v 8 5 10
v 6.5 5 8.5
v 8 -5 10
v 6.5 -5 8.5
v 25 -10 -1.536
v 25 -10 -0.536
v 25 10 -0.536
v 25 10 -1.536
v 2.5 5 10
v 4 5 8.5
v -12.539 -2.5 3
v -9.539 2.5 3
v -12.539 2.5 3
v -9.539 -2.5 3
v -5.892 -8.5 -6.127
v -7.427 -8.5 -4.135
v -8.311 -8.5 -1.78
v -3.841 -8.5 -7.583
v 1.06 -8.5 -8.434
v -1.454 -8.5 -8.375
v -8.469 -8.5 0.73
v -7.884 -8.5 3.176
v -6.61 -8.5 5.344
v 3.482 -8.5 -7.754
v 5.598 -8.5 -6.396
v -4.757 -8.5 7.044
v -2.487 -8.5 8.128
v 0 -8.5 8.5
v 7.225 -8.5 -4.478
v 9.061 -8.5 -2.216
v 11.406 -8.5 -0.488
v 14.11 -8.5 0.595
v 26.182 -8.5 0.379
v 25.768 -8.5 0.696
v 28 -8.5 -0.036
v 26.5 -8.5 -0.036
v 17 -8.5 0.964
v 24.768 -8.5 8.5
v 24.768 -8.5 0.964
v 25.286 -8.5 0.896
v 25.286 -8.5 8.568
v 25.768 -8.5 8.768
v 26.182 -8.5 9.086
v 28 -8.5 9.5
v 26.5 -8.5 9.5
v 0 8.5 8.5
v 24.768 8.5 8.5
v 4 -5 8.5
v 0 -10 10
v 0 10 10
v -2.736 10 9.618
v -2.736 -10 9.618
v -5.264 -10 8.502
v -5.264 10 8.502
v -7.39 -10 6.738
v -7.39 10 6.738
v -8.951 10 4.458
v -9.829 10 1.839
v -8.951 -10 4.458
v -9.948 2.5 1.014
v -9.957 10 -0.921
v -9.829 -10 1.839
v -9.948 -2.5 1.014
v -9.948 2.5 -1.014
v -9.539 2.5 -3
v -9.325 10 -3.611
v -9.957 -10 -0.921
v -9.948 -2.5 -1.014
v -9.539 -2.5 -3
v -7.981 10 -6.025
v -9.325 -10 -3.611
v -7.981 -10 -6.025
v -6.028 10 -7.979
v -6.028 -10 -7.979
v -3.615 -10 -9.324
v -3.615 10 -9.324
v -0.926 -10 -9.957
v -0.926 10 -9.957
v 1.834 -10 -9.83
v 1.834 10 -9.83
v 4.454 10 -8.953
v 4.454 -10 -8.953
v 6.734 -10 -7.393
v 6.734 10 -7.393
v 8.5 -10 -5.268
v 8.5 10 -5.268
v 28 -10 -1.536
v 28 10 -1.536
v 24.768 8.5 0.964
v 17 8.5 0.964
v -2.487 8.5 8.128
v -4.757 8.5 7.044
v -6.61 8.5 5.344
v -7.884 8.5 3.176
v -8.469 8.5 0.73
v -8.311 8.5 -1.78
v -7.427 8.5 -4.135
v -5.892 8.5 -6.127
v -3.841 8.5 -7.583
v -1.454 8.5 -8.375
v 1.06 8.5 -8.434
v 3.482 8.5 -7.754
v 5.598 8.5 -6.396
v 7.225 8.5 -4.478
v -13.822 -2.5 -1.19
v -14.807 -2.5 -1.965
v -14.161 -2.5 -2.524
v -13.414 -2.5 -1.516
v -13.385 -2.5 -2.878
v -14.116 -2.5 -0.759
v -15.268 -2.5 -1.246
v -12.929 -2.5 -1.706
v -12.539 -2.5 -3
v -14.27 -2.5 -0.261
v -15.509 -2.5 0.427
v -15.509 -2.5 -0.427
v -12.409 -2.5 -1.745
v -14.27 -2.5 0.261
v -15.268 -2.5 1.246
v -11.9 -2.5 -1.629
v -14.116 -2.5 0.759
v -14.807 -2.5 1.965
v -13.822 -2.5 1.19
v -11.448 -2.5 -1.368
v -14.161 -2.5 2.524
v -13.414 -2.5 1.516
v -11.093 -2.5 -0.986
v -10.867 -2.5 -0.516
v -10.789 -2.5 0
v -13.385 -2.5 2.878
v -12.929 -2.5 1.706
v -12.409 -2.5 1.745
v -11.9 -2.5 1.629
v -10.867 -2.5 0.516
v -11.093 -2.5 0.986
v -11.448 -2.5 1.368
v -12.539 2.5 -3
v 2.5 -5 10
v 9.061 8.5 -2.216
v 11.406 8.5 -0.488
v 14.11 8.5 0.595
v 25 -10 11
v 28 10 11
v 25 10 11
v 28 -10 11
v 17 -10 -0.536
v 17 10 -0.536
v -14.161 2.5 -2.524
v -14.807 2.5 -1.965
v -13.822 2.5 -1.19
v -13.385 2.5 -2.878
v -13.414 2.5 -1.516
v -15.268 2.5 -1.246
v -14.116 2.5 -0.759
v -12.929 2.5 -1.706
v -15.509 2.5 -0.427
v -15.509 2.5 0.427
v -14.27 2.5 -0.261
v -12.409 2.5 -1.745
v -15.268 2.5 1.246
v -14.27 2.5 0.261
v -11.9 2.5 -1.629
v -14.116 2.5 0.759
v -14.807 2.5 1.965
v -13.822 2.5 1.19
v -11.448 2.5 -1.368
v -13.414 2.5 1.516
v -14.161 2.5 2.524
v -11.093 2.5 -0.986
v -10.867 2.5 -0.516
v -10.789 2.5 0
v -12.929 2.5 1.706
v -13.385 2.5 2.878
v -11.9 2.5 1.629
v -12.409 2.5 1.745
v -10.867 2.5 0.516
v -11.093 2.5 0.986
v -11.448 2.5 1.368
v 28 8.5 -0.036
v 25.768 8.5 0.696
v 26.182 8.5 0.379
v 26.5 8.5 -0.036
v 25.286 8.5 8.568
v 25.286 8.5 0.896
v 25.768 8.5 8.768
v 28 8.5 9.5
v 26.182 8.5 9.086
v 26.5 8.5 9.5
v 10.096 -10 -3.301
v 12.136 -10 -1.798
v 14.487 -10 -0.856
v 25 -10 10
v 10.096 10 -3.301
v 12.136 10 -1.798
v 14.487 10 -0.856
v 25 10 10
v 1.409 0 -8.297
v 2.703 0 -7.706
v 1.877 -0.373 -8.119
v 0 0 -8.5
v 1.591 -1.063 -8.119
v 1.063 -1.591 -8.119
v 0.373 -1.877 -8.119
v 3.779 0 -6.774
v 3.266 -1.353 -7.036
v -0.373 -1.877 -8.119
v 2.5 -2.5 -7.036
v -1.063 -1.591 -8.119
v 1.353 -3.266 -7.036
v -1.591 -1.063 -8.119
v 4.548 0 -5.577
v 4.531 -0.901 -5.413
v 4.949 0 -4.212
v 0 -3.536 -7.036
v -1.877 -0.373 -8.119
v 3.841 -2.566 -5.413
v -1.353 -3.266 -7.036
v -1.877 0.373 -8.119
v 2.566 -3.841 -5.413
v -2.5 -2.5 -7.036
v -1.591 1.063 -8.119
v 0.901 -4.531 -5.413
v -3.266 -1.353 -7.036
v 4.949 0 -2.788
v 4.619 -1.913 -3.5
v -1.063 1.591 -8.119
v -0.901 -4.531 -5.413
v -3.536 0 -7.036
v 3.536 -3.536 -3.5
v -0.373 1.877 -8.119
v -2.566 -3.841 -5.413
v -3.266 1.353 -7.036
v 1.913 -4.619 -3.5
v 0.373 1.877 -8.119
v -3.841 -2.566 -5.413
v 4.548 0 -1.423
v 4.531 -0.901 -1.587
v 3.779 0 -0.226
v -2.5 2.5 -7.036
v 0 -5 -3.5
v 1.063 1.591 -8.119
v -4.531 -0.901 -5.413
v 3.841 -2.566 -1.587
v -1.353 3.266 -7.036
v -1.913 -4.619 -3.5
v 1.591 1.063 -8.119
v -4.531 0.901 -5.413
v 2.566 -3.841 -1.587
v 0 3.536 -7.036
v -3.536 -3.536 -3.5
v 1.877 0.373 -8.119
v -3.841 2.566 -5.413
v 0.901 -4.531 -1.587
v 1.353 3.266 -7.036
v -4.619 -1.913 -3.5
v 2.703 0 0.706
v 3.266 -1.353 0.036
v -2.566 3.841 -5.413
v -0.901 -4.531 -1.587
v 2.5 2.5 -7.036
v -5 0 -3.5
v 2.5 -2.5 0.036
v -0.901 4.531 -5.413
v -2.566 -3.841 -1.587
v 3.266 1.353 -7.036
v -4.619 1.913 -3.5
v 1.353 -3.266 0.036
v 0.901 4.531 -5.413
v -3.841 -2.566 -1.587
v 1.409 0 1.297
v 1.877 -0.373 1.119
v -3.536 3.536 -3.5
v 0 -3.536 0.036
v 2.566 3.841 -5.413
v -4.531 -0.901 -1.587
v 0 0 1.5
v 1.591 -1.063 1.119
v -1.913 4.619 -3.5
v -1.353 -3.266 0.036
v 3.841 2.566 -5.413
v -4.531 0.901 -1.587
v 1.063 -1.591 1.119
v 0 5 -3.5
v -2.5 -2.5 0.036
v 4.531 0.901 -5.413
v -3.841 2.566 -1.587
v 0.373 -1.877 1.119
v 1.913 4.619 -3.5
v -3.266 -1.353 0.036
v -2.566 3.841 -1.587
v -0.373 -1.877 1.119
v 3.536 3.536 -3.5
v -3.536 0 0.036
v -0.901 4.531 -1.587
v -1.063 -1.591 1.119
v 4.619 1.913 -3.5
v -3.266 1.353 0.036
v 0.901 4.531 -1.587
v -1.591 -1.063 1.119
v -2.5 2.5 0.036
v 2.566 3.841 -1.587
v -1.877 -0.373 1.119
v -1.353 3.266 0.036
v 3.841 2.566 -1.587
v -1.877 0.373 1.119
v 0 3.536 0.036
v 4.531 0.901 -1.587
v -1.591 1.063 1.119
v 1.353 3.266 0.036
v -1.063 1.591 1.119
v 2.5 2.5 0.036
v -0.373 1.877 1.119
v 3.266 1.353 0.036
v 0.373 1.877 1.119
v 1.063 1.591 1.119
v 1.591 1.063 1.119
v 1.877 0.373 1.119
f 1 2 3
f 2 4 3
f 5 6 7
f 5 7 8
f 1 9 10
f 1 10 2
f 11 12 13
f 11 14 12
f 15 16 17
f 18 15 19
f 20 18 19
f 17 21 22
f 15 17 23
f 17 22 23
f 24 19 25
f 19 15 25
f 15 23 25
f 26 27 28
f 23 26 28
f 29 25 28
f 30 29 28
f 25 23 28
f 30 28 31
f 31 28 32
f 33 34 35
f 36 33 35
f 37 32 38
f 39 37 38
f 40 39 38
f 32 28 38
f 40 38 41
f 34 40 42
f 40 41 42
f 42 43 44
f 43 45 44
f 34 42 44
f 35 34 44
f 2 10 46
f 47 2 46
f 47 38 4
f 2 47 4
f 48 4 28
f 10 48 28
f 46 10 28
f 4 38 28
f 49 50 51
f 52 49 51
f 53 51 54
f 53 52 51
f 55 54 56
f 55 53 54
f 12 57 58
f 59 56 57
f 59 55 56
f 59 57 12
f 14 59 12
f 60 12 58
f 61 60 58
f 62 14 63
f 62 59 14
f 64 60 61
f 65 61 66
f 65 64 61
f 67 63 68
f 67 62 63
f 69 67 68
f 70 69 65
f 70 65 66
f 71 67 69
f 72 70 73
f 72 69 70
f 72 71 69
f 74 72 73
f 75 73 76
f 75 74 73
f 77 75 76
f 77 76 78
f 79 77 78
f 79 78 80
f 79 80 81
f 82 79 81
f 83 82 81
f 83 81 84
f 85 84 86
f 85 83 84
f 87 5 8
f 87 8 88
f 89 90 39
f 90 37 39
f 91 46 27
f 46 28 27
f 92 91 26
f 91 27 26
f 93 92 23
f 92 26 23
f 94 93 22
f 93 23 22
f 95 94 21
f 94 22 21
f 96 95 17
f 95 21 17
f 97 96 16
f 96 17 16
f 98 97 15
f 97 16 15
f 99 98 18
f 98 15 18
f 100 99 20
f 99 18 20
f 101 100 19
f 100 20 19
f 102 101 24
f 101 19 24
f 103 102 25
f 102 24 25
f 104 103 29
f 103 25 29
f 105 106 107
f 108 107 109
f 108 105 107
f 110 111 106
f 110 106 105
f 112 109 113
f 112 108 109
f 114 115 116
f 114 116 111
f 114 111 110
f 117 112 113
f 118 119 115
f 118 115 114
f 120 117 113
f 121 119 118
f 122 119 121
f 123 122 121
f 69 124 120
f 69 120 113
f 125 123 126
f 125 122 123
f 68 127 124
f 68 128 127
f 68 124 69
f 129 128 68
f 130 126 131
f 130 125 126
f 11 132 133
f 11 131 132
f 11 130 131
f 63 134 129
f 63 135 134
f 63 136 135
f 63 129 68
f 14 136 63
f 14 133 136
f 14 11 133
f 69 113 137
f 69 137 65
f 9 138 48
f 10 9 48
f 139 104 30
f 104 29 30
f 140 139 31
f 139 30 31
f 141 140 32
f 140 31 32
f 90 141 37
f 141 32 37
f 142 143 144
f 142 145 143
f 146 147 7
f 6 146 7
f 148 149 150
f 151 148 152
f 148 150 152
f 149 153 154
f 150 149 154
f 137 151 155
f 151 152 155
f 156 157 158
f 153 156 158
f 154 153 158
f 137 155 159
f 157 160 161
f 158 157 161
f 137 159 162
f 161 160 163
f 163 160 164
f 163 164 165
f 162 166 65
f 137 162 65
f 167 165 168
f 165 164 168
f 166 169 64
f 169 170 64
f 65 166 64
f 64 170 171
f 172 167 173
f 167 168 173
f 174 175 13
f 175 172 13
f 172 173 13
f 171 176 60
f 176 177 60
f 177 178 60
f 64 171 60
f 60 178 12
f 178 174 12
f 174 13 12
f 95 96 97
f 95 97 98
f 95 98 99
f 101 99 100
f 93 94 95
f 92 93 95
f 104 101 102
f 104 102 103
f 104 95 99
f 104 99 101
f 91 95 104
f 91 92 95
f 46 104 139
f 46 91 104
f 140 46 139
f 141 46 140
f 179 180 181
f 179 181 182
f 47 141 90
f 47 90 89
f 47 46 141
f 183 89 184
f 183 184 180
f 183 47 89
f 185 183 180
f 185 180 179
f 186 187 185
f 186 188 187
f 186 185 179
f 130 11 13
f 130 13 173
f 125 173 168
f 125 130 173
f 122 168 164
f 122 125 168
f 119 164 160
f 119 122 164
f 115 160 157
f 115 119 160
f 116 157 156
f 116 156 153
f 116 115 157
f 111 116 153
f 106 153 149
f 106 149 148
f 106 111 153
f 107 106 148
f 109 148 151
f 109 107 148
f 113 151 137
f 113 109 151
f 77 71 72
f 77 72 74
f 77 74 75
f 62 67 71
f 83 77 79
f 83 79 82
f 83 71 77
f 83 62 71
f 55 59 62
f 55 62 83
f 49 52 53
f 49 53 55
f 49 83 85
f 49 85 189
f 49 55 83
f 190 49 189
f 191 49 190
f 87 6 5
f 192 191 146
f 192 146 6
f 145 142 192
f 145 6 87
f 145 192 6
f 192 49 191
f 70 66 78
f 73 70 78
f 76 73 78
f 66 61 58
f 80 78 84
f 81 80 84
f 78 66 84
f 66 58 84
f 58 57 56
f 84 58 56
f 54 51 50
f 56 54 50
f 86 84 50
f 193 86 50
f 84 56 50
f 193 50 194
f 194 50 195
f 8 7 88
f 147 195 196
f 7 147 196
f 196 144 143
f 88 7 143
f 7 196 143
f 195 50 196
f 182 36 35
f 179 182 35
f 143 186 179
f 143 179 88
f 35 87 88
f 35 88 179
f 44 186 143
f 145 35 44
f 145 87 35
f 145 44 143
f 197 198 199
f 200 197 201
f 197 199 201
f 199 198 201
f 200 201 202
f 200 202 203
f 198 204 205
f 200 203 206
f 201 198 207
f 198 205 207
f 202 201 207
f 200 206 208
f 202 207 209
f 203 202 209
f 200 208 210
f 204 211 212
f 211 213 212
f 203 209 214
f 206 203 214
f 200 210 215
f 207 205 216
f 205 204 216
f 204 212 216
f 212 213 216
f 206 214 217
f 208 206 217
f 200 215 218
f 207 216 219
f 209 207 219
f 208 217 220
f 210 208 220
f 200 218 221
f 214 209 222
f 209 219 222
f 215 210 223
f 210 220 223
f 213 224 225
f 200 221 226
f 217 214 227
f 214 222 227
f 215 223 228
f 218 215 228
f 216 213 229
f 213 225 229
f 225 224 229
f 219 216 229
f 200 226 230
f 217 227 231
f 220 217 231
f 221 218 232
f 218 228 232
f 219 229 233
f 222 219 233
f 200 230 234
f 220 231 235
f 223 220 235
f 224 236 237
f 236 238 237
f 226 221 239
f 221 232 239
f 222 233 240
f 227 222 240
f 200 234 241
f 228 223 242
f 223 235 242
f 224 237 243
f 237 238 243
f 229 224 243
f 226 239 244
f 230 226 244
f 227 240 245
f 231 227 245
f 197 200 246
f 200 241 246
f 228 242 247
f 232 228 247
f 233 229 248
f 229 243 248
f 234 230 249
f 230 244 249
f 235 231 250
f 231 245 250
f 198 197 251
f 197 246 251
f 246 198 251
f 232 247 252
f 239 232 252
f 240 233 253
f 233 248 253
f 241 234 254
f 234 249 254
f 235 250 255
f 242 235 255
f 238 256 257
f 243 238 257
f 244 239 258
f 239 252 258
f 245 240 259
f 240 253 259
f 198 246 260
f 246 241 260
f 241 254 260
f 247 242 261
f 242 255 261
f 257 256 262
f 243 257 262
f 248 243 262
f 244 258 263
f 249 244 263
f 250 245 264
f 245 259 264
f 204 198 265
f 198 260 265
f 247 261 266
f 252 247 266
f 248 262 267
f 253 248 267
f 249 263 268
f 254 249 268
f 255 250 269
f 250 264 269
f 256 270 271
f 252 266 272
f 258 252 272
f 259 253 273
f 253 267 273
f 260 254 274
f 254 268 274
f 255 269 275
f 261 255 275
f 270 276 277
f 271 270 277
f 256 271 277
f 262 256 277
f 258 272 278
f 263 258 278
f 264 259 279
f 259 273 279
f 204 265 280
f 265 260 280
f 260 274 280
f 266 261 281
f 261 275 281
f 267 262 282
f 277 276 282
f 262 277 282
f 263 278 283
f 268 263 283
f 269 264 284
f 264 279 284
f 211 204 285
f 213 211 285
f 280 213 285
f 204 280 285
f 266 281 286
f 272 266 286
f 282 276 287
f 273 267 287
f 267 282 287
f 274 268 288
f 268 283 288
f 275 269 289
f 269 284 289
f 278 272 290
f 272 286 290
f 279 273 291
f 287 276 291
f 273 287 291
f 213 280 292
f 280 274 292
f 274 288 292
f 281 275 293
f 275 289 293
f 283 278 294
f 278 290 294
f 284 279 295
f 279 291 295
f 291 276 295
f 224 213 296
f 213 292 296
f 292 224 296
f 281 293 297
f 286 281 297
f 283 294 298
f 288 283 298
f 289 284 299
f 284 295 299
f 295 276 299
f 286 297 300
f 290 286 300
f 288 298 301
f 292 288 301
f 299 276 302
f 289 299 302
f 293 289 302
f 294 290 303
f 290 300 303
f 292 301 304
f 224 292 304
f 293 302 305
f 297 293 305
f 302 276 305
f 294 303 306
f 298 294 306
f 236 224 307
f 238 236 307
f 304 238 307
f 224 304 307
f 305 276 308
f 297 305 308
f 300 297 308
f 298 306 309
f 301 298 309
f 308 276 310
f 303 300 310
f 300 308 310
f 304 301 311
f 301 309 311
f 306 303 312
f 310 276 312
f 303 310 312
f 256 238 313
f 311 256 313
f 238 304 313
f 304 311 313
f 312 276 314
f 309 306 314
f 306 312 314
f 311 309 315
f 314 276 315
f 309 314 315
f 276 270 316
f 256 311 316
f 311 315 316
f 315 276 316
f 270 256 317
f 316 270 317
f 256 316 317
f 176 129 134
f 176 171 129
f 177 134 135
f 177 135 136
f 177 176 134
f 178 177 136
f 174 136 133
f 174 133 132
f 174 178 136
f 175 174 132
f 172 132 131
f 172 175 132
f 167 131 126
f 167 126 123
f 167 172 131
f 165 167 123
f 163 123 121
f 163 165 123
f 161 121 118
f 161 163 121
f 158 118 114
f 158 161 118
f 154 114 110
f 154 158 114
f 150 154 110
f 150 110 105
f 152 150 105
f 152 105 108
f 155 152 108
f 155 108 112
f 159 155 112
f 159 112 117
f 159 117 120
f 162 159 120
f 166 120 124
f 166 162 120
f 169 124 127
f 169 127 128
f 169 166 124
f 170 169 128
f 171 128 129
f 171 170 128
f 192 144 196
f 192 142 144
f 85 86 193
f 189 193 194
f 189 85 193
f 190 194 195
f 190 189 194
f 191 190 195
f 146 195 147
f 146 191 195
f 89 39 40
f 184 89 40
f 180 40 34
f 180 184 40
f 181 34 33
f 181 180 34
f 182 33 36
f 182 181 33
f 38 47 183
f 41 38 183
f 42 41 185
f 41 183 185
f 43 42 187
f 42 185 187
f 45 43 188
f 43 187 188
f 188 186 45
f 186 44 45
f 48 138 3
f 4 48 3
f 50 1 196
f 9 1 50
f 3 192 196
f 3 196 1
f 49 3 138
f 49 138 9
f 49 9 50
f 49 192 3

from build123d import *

# Parameters (mm, degrees)
F1_DEPTH    = 10
F2_T        = -1.5
F4_DEPTH    = 5
F5_R        = 1.75
F6_DEPTH    = 2.5
F9_T1_DEPTH = 17


# Not quite as in the source:
# - a fillet or chamfer that OpenCascade refuses, or shapes differently, is made with other operations: its cross-section is extruded or revolved along the edge and cut away or added


with BuildPart() as f1:
    # F0 (on Front) → F1 (new body, symmetric)
    with BuildSketch(Plane.XZ):
        with BuildLine():
            Line((25, 10), (0, 10))
            ThreePointArc((0, 10), (-8.7372269275, -4.8642435813), (8.5, -5.2678268764))
            ThreePointArc((8.5, -5.2678268764), (12.1357564187, -1.7984268254), (17, -0.5356537529))
            Line((17, -0.5356537529), (25, -0.5356537529))
            Line((25, -0.5356537529), (25, -1.5356537529))
            Line((25, -1.5356537529), (28, -1.5356537529))
            Line((28, -1.5356537529), (28, 11))
            Line((28, 11), (25, 11))
            Line((25, 11), (25, 10))
        make_face()
    extrude(amount=F1_DEPTH, both=True)

    # F2
    f2_openings = [f1.faces().sort_by_distance(p)[0] for p in [
        (28, 0, 4.732173),
    ]]
    offset(amount=F2_T, openings=f2_openings, kind=Kind.INTERSECTION)

    # F3 (on Front) → F4 (cut, symmetric)
    with BuildSketch(Plane.XZ):
        Polygon((8, 10), (2.5, 10), (4, 8.5), (6.5, 8.5), align=None)
    extrude(amount=F4_DEPTH, both=True, mode=Mode.SUBTRACT)

    # F5 (on Front) → F6 (join, symmetric)
    with BuildSketch(Plane.XZ):
        with BuildLine():
            Line((-9.5393920142, 3), (-12.5393920142, 3))
            ThreePointArc((-12.5393920142, 3), (-15.5393920142, 0), (-12.5393920142, -3))
            Line((-12.5393920142, -3), (-9.5393920142, -3))
            Line((-9.5393920142, -3), (-9.5393920142, 3))
        make_face()
        with Locations((-12.5393920142, 0)):
            Circle(F5_R, mode=Mode.SUBTRACT)
    extrude(amount=F6_DEPTH, both=True)

    # F9: fillet of radius 2 on 2 edges, made by hand

    # F9_s2 → F9_t1 (cut)
    with BuildSketch(Plane.XZ.offset(-8.5)):
        with BuildLine():
            ThreePointArc((24.7679491924, 0.9643462471), (25.7679491924, 0.6963970547), (26.5, -0.0356537529))
            Line((26.5, -0.0356537529), (26.5, 0.9643462471))
            Line((26.5, 0.9643462471), (24.7679491924, 0.9643462471))
        make_face()
        with BuildLine():
            ThreePointArc((24.7679491924, 8.5), (25.7679491924, 8.7679491924), (26.5, 9.5))
            Line((26.5, 9.5), (26.5, 8.5))
            Line((26.5, 8.5), (24.7679491924, 8.5))
        make_face()
    extrude(amount=F9_T1_DEPTH, mode=Mode.SUBTRACT)


with BuildPart() as f8:
    # F7 (on Front) → F8 (revolve)
    with BuildSketch(Plane.XZ):
        with BuildLine():
            Line((0, 1.5), (0, -8.5))
            ThreePointArc((0, -8.5), (5, -3.5), (0, 1.5))
        make_face()
    revolve(axis=Axis((0, 0, -3.5), (0, 0, -1)))


solid = Compound([f1.part, f8.part])
